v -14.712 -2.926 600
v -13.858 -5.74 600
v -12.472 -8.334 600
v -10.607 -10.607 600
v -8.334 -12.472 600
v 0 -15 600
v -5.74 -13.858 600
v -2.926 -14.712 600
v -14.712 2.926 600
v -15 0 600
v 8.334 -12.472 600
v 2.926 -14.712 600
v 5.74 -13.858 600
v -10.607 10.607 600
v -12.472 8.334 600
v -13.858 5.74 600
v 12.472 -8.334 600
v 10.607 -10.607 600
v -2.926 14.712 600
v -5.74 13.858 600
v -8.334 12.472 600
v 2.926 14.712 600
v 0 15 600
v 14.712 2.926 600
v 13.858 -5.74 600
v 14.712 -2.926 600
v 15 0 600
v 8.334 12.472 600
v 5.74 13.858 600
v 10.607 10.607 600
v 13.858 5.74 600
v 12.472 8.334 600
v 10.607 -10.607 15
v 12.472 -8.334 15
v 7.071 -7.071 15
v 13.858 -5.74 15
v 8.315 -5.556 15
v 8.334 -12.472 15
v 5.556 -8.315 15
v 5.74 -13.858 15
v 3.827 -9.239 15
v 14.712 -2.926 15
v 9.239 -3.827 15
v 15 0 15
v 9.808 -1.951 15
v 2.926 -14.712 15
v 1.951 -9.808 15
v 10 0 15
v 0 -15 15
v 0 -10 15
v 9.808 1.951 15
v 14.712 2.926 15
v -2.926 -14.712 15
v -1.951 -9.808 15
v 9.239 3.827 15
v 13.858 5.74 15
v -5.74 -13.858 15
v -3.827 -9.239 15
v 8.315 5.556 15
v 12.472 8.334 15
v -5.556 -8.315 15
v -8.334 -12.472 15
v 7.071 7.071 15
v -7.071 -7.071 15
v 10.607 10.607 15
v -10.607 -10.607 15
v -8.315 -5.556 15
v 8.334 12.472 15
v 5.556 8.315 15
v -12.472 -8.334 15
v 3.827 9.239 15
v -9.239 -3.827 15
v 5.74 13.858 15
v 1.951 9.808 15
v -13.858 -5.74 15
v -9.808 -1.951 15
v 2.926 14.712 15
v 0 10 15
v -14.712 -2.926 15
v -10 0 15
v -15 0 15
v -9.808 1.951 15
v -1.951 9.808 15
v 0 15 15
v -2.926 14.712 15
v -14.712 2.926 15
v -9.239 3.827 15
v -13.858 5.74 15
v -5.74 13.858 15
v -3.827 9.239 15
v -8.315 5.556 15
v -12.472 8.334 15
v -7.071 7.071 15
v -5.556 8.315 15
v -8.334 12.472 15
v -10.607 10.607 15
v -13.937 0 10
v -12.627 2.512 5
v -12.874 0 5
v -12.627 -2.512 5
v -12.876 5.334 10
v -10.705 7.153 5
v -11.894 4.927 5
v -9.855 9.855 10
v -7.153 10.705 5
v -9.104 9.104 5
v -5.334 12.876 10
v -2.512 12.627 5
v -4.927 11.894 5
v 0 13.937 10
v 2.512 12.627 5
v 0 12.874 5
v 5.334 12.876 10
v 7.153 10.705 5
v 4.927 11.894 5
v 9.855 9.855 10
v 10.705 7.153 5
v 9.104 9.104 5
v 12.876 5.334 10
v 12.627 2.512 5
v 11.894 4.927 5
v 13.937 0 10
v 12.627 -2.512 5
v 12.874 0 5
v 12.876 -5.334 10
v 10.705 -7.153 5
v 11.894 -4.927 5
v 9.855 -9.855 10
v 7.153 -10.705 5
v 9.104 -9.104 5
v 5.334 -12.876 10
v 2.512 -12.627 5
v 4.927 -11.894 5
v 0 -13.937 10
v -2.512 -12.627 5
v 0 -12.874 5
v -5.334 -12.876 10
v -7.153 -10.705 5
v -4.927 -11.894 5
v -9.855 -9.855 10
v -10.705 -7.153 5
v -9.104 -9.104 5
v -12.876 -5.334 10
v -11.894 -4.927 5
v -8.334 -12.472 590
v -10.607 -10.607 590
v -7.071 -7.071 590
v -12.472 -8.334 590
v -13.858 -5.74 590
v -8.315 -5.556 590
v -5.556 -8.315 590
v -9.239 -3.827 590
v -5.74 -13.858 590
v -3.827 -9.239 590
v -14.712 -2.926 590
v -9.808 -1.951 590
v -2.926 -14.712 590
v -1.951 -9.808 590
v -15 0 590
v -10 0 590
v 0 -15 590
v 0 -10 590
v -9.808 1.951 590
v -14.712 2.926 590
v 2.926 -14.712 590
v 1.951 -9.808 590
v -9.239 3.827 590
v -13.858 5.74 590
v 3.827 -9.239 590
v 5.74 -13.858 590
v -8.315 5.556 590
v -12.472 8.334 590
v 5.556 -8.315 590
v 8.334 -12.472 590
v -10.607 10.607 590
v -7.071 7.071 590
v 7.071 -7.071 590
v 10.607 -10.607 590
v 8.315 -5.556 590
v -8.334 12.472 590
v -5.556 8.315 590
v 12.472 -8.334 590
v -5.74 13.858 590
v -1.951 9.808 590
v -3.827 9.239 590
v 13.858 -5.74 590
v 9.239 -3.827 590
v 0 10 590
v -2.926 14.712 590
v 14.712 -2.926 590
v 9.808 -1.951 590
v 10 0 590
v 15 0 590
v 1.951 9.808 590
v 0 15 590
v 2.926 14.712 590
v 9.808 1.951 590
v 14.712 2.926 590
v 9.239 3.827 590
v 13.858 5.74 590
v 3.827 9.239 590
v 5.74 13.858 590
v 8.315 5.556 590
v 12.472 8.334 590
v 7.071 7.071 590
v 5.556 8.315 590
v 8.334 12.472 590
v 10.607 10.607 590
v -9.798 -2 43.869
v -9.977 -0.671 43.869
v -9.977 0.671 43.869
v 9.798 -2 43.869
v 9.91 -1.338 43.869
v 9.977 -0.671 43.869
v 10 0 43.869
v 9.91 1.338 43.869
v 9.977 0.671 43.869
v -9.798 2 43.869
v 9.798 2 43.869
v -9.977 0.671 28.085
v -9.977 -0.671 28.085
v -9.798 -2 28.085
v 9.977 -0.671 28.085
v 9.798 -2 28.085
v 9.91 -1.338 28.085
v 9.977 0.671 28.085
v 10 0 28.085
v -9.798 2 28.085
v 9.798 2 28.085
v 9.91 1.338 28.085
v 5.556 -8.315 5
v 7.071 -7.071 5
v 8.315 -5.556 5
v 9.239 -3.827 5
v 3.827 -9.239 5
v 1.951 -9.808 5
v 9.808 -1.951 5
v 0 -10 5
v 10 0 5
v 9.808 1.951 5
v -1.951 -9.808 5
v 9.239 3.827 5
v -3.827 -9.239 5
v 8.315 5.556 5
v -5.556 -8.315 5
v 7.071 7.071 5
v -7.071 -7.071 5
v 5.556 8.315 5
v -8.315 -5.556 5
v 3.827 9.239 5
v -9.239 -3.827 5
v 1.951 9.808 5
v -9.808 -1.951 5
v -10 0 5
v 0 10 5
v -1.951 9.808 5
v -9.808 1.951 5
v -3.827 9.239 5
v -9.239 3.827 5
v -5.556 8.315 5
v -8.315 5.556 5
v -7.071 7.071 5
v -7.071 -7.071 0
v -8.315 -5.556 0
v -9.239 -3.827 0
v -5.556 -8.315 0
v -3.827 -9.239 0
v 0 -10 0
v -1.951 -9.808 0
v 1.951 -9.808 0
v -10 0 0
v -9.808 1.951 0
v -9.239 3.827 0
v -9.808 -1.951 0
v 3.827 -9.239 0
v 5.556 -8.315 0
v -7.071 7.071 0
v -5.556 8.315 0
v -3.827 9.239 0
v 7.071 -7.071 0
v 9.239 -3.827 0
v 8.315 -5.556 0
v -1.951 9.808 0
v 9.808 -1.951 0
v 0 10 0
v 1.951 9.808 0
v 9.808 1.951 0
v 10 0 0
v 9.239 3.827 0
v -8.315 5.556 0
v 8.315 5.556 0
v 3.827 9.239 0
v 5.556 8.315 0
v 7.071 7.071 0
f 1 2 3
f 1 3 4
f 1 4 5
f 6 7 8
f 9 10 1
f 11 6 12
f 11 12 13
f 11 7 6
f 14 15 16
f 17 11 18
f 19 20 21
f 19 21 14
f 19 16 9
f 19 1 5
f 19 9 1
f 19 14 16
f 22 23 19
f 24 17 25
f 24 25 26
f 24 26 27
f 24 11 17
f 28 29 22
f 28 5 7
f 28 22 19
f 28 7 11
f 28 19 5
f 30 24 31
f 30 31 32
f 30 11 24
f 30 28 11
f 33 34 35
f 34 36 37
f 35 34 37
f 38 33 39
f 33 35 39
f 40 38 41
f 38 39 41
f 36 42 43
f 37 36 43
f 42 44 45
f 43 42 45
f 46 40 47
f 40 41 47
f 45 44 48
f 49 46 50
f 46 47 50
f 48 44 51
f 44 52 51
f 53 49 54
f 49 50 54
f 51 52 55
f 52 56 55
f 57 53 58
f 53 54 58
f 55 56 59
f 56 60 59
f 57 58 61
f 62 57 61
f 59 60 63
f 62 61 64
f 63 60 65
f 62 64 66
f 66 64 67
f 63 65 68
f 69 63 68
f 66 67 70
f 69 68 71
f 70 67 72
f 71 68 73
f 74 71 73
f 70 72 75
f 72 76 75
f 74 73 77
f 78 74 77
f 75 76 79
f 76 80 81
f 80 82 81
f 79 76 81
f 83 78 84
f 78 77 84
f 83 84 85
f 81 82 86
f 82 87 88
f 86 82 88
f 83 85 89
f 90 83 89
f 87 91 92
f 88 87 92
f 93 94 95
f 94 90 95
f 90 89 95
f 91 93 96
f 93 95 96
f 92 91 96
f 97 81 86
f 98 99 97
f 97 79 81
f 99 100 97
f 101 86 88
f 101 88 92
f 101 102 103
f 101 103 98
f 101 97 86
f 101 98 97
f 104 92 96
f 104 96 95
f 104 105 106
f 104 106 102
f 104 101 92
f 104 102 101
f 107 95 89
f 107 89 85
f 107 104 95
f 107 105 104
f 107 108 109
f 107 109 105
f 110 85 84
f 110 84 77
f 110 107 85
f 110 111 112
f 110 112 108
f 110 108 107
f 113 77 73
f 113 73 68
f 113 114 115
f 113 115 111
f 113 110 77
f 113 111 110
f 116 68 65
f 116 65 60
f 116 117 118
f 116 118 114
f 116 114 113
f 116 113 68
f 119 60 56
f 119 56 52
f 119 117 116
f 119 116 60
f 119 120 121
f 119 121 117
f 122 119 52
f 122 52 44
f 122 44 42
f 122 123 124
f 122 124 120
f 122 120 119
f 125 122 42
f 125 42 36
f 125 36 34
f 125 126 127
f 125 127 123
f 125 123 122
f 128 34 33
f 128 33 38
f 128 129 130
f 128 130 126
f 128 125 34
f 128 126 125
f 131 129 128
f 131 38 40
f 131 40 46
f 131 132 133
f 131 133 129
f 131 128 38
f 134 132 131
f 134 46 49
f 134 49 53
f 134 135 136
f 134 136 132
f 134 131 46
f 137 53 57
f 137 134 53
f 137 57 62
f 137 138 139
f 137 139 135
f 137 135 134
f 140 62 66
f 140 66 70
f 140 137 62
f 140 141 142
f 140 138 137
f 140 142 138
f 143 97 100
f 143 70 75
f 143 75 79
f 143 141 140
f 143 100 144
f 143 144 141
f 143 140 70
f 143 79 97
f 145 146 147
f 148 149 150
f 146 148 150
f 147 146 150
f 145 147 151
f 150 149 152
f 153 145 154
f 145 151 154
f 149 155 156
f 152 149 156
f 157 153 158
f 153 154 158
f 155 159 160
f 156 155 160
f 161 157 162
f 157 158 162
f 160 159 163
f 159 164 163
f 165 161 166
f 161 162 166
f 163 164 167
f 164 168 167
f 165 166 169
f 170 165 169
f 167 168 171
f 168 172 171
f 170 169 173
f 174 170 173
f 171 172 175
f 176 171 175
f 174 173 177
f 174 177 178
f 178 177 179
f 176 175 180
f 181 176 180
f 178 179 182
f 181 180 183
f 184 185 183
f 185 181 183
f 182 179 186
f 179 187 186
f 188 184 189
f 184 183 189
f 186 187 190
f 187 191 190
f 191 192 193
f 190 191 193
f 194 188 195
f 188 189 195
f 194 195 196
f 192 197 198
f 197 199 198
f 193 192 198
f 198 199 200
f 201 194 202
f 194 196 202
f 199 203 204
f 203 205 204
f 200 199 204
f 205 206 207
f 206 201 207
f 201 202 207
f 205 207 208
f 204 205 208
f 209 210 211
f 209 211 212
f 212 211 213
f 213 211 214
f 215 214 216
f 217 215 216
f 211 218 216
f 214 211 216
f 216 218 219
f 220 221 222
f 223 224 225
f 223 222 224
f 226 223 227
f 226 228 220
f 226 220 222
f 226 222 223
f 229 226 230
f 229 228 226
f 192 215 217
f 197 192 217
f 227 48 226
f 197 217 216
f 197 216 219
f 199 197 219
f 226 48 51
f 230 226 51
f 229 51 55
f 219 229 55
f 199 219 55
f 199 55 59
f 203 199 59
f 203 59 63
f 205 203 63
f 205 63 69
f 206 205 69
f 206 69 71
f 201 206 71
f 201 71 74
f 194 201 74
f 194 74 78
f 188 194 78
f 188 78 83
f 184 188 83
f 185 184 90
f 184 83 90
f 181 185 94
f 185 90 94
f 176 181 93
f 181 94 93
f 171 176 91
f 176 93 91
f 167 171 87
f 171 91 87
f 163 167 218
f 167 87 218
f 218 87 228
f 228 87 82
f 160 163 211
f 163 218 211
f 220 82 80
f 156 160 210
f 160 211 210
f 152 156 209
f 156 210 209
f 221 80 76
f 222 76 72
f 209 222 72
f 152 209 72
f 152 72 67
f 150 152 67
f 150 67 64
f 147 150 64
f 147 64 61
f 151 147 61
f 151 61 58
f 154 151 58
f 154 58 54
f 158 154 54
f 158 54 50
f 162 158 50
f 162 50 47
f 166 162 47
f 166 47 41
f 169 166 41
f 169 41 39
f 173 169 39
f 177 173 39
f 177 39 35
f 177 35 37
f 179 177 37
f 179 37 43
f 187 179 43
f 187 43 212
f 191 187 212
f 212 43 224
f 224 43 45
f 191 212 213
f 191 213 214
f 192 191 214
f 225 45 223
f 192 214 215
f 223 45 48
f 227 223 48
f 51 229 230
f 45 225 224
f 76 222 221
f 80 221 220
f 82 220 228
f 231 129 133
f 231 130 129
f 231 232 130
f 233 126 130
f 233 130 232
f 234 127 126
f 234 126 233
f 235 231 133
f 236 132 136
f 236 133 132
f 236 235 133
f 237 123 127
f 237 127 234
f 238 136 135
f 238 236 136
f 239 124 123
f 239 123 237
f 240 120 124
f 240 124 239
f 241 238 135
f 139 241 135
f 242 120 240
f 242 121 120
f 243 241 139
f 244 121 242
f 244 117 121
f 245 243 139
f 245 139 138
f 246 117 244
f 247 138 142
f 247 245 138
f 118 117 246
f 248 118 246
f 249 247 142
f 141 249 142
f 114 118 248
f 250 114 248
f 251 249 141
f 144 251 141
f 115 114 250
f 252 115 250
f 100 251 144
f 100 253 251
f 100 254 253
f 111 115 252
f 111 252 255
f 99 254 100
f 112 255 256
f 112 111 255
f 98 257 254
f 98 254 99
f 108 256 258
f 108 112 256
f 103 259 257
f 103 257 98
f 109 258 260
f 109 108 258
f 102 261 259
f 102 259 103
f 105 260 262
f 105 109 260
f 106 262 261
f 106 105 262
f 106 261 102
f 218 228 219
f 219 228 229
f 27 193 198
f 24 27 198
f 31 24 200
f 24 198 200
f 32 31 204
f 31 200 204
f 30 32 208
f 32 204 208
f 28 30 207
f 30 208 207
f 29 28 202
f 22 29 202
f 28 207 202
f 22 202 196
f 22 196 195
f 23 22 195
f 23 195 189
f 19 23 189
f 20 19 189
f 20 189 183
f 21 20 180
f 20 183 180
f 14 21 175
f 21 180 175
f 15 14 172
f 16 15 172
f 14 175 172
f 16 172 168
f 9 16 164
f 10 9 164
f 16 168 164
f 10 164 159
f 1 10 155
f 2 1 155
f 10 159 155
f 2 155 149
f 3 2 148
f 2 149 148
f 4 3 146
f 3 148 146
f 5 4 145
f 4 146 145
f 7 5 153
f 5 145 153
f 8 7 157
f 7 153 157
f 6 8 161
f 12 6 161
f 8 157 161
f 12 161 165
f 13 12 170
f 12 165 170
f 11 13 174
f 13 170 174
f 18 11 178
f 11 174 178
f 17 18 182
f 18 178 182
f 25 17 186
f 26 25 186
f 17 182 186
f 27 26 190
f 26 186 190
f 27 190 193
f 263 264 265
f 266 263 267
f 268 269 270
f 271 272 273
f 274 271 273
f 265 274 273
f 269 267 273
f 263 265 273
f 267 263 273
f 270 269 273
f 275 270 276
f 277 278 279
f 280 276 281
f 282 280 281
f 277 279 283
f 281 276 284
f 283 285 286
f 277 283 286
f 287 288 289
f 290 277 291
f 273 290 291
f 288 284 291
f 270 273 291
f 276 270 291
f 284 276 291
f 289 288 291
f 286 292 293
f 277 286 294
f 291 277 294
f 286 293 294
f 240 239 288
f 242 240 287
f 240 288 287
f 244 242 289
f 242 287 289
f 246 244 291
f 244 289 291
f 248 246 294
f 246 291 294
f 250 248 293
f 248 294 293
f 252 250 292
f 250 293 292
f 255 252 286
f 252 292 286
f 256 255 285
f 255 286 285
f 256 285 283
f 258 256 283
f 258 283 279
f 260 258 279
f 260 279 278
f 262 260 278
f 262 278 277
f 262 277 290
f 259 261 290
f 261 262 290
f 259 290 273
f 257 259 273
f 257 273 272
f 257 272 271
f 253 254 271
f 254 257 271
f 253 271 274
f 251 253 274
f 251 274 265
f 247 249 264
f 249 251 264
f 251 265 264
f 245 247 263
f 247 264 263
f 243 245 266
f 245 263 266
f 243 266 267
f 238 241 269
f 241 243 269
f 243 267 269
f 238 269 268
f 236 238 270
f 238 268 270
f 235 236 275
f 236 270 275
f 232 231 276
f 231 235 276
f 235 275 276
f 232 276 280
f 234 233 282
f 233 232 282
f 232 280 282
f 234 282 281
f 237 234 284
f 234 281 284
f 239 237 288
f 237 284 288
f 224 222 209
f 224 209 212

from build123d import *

# Parameters (mm, degrees)
SKETCH1_R               = 10
BOSS_EXTRUDE1_DEPTH     = 590
SKETCH2_R               = 15
BOSS_EXTRUDE2_DEPTH     = 10
SKETCH3_R               = 15
BOSS_EXTRUDE3_DEPTH     = 10
BOSS_EXTRUDE3_TAPER     = 12
BODY_MOVE_COPY1_ANGLE   = 90
CUT_EXTRUDE1_DEPTH      = 2
CUT_EXTRUDE1_DEPTH_BACK = 2
SKETCH4_W               = 20
SKETCH4_H               = 15.783753313


with BuildPart() as part:
    # Sketch1 → Boss-Extrude1 (new body)
    with BuildSketch(Plane(origin=(0, 0, 0), x_dir=(1, 0, 0), z_dir=(0, 1, 0))):
        Circle(SKETCH1_R)
    extrude(amount=BOSS_EXTRUDE1_DEPTH)

    # Sketch2 → Boss-Extrude2 (add)
    with BuildSketch(Plane(origin=(0, 590, 0), x_dir=(1, 0, 0), z_dir=(0, 1, 0))):
        Circle(SKETCH2_R)
    extrude(amount=BOSS_EXTRUDE2_DEPTH)

    # Sketch3 → Boss-Extrude3 (add)
    with BuildSketch(Plane(origin=(0, 15, 0), x_dir=(-1, 0, 0), z_dir=(0, -1, 0))):
        Circle(SKETCH3_R)
    extrude(amount=BOSS_EXTRUDE3_DEPTH, taper=BOSS_EXTRUDE3_TAPER)


with BuildPart() as part_1:
    # Body-Move/Copy1: moved
    add(part.part.rotate(Axis((0, 0, 0), (1, 0, 0)), BODY_MOVE_COPY1_ANGLE))

    # Sketch4 → Cut-Extrude1 (cut, two sides: drawn at the far end of the back side and taken through both)
    with BuildSketch(Plane(origin=(0, 0, 0), x_dir=(1, 0, 0), z_dir=(0, 1, 0)).offset(-CUT_EXTRUDE1_DEPTH_BACK)):
        with Locations((0, -35.976721821)):
            Rectangle(SKETCH4_W, SKETCH4_H)
    extrude(amount=CUT_EXTRUDE1_DEPTH + CUT_EXTRUDE1_DEPTH_BACK, mode=Mode.SUBTRACT)


solid = part_1.part
